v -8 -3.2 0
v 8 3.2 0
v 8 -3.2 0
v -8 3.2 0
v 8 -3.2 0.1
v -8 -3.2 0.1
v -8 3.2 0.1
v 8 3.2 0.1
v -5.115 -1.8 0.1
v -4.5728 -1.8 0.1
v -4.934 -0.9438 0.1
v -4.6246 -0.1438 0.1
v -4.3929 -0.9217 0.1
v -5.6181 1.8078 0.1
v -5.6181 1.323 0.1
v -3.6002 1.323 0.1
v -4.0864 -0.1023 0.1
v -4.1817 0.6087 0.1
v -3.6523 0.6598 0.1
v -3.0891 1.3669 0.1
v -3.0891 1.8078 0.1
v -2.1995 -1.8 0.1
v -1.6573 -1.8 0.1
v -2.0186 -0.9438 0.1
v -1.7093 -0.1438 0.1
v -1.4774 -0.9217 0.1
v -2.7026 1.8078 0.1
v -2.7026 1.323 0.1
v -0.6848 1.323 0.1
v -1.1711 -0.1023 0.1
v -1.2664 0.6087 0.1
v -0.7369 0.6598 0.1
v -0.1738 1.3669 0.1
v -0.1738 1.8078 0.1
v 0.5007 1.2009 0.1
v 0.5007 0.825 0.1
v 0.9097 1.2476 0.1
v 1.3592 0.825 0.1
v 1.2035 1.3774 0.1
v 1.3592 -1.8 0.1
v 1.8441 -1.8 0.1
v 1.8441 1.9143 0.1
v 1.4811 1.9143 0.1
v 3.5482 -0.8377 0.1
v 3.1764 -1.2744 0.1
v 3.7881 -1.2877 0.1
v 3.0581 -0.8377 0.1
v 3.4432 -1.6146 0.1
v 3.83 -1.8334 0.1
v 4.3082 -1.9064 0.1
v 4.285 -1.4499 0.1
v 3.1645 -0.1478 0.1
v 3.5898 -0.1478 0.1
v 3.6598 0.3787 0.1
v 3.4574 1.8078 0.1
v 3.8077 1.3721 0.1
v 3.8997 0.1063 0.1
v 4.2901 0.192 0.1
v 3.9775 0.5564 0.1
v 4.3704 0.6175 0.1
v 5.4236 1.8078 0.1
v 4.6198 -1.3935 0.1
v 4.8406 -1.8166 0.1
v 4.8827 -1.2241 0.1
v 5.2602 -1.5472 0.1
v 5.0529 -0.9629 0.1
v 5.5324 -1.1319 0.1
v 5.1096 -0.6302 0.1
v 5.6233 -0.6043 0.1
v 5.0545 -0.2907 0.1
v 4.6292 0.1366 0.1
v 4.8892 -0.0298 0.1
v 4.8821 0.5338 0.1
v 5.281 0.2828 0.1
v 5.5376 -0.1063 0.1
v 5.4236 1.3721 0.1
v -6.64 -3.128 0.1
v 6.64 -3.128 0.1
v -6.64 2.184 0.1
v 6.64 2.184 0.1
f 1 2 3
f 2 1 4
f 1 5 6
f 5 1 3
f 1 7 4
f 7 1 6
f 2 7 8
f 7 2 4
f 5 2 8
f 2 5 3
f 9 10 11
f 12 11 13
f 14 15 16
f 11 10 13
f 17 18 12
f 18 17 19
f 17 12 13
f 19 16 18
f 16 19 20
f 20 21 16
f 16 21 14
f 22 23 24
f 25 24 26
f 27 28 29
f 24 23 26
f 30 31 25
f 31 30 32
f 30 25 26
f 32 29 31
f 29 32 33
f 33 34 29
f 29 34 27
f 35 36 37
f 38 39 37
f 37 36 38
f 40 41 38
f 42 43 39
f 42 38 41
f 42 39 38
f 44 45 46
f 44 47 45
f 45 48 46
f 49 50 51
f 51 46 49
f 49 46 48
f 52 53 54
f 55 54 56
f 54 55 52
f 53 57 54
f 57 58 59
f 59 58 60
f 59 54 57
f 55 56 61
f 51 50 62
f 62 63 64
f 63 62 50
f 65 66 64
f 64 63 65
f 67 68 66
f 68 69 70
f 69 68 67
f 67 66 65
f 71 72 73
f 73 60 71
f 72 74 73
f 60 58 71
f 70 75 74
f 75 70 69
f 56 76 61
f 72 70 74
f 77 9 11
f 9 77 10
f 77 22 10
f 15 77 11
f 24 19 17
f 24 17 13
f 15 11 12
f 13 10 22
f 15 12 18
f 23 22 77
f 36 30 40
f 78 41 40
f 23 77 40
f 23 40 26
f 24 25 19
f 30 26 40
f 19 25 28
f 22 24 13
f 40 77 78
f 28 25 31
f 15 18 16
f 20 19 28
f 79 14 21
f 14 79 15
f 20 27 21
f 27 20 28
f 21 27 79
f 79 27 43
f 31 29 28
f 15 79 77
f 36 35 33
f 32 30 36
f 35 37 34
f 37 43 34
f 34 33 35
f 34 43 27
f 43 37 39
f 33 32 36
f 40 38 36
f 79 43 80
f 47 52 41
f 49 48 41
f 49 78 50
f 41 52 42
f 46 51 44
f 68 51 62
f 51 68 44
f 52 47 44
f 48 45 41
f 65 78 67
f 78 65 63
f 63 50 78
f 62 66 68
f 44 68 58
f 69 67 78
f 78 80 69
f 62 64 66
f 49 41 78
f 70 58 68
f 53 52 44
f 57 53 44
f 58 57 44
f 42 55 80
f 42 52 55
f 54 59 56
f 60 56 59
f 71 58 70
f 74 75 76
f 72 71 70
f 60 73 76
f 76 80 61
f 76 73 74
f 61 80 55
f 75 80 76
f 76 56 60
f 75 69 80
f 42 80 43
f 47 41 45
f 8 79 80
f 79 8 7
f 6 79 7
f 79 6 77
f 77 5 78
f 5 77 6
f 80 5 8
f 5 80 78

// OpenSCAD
// file: ../p/box5-12.scad
use <../lib.scad>
function ldraw_lib__box5_12() = [
// 0 Box with 5 Faces without Any Edges
// 0 Name: box5-12.dat
// 0 Author: Chris Dee [cwdee]
// 0 !LDRAW_ORG Primitive UPDATE 2009-02
// 0 !LICENSE Licensed under CC BY 4.0 : see CAreadme.txt
// 
// 0 BFC CERTIFY CCW
  [0,"BFC","CERTIFY"],
  [0,"BFC","CCW"],
// 
// 0 !HISTORY 2009-09-03 [PTadmin] Official Update 2009-02
// 
// 
// 4 16 1 1 1 1 1 -1 -1 1 -1 -1 1 1
  [4,16,1,1,1,1,1,-1,-1,1,-1,-1,1,1],
// 4 16 -1 0 1 1 0 1 1 1 1 -1 1 1
  [4,16,-1,0,1,1,0,1,1,1,1,-1,1,1],
// 4 16 -1 0 -1 -1 0 1 -1 1 1 -1 1 -1
  [4,16,-1,0,-1,-1,0,1,-1,1,1,-1,1,-1],
// 4 16 1 0 -1 -1 0 -1 -1 1 -1 1 1 -1
  [4,16,1,0,-1,-1,0,-1,-1,1,-1,1,1,-1],
// 4 16 1 0 1 1 0 -1 1 1 -1 1 1 1
  [4,16,1,0,1,1,0,-1,1,1,-1,1,1,1],
// 0
];
module ldraw_lib__box5_12(step=0, col=false, unit=2/5, alt=false, line=0.2, solid=!$preview)
    makepoly(ldraw_lib__box5_12(), step=step, col=col, unit=unit, alt=alt, line=line, solid=solid);
ldraw_lib__box5_12(line=0.2);
// main file
use <../lib.scad>
use <../p/box5-12.scad>
use <s/196925s01.scad>
function ldraw_lib__196925b() = [
// 0 Sticker  0.8 x  2 with White "7715"
// 0 Name: 196925b.dat
// 0 Author: Takeshi Takahashi [RainbowDolphin]
// 0 !LDRAW_ORG Part UPDATE 2025-04
// 0 !LICENSE Licensed under CC BY 4.0 : see CAreadme.txt
// 
// 0 BFC CERTIFY CCW
  [0,"BFC","CERTIFY"],
  [0,"BFC","CCW"],
// 
// 0 !KEYWORDS 12V Trains, Bricklink 7715stk01, locomotive, Rebrickable 196925
// 0 !KEYWORDS Set 7715
// 
// 0 !HISTORY 2021-10-28 [RainbowDolphin] Created based on 196935b by Steffen [Steffen]
// 0 !HISTORY 2025-03-28 [Holly-Wood] Removed NOCLIP
// 0 !HISTORY 2025-04-27 [OrionP] Official Update 2025-04
// 
// 1 16 0 -0.25 0 20 0 0 0 0.25 0 0 0 -8 box5-12.dat
  [1,16,0,-0.25,0,20,0,0,0,0.25,0,0,0,-8, ldraw_lib__box5_12()],
// 1 16 0 -0.25 -4.5 0.415 0 0 0 1 0 0 0 0.415 s\196925s01.dat
  [1,16,0,-0.25,-4.5,0.415,0,0,0,1,0,0,0,0.415, ldraw_lib__s__196925s01()],
// 4 16 -20 -0.25 8 -16.6 -0.25 5.46 16.6 -0.25 5.46 20 -0.25 8
  [4,16,-20,-0.25,8,-16.6,-0.25,5.46,16.6,-0.25,5.46,20,-0.25,8],
// 4 16 -16.6 -0.25 5.46 -20 -0.25 8 -20 -0.25 -8 -16.6 -0.25 -7.82
  [4,16,-16.6,-0.25,5.46,-20,-0.25,8,-20,-0.25,-8,-16.6,-0.25,-7.82],
// 4 16 -16.6 -0.25 -7.82 -20 -0.25 -8 20 -0.25 -8 16.6 -0.25 -7.82
  [4,16,-16.6,-0.25,-7.82,-20,-0.25,-8,20,-0.25,-8,16.6,-0.25,-7.82],
// 4 16 20 -0.25 8 16.6 -0.25 5.46 16.6 -0.25 -7.82 20 -0.25 -8
  [4,16,20,-0.25,8,16.6,-0.25,5.46,16.6,-0.25,-7.82,20,-0.25,-8],
];
module ldraw_lib__196925b(step=0, col=false, unit=2/5, alt=false, line=0.2, solid=!$preview)
    makepoly(ldraw_lib__196925b(), step=step, col=col, unit=unit, alt=alt, line=line, solid=solid);
ldraw_lib__196925b(line=0.2);
